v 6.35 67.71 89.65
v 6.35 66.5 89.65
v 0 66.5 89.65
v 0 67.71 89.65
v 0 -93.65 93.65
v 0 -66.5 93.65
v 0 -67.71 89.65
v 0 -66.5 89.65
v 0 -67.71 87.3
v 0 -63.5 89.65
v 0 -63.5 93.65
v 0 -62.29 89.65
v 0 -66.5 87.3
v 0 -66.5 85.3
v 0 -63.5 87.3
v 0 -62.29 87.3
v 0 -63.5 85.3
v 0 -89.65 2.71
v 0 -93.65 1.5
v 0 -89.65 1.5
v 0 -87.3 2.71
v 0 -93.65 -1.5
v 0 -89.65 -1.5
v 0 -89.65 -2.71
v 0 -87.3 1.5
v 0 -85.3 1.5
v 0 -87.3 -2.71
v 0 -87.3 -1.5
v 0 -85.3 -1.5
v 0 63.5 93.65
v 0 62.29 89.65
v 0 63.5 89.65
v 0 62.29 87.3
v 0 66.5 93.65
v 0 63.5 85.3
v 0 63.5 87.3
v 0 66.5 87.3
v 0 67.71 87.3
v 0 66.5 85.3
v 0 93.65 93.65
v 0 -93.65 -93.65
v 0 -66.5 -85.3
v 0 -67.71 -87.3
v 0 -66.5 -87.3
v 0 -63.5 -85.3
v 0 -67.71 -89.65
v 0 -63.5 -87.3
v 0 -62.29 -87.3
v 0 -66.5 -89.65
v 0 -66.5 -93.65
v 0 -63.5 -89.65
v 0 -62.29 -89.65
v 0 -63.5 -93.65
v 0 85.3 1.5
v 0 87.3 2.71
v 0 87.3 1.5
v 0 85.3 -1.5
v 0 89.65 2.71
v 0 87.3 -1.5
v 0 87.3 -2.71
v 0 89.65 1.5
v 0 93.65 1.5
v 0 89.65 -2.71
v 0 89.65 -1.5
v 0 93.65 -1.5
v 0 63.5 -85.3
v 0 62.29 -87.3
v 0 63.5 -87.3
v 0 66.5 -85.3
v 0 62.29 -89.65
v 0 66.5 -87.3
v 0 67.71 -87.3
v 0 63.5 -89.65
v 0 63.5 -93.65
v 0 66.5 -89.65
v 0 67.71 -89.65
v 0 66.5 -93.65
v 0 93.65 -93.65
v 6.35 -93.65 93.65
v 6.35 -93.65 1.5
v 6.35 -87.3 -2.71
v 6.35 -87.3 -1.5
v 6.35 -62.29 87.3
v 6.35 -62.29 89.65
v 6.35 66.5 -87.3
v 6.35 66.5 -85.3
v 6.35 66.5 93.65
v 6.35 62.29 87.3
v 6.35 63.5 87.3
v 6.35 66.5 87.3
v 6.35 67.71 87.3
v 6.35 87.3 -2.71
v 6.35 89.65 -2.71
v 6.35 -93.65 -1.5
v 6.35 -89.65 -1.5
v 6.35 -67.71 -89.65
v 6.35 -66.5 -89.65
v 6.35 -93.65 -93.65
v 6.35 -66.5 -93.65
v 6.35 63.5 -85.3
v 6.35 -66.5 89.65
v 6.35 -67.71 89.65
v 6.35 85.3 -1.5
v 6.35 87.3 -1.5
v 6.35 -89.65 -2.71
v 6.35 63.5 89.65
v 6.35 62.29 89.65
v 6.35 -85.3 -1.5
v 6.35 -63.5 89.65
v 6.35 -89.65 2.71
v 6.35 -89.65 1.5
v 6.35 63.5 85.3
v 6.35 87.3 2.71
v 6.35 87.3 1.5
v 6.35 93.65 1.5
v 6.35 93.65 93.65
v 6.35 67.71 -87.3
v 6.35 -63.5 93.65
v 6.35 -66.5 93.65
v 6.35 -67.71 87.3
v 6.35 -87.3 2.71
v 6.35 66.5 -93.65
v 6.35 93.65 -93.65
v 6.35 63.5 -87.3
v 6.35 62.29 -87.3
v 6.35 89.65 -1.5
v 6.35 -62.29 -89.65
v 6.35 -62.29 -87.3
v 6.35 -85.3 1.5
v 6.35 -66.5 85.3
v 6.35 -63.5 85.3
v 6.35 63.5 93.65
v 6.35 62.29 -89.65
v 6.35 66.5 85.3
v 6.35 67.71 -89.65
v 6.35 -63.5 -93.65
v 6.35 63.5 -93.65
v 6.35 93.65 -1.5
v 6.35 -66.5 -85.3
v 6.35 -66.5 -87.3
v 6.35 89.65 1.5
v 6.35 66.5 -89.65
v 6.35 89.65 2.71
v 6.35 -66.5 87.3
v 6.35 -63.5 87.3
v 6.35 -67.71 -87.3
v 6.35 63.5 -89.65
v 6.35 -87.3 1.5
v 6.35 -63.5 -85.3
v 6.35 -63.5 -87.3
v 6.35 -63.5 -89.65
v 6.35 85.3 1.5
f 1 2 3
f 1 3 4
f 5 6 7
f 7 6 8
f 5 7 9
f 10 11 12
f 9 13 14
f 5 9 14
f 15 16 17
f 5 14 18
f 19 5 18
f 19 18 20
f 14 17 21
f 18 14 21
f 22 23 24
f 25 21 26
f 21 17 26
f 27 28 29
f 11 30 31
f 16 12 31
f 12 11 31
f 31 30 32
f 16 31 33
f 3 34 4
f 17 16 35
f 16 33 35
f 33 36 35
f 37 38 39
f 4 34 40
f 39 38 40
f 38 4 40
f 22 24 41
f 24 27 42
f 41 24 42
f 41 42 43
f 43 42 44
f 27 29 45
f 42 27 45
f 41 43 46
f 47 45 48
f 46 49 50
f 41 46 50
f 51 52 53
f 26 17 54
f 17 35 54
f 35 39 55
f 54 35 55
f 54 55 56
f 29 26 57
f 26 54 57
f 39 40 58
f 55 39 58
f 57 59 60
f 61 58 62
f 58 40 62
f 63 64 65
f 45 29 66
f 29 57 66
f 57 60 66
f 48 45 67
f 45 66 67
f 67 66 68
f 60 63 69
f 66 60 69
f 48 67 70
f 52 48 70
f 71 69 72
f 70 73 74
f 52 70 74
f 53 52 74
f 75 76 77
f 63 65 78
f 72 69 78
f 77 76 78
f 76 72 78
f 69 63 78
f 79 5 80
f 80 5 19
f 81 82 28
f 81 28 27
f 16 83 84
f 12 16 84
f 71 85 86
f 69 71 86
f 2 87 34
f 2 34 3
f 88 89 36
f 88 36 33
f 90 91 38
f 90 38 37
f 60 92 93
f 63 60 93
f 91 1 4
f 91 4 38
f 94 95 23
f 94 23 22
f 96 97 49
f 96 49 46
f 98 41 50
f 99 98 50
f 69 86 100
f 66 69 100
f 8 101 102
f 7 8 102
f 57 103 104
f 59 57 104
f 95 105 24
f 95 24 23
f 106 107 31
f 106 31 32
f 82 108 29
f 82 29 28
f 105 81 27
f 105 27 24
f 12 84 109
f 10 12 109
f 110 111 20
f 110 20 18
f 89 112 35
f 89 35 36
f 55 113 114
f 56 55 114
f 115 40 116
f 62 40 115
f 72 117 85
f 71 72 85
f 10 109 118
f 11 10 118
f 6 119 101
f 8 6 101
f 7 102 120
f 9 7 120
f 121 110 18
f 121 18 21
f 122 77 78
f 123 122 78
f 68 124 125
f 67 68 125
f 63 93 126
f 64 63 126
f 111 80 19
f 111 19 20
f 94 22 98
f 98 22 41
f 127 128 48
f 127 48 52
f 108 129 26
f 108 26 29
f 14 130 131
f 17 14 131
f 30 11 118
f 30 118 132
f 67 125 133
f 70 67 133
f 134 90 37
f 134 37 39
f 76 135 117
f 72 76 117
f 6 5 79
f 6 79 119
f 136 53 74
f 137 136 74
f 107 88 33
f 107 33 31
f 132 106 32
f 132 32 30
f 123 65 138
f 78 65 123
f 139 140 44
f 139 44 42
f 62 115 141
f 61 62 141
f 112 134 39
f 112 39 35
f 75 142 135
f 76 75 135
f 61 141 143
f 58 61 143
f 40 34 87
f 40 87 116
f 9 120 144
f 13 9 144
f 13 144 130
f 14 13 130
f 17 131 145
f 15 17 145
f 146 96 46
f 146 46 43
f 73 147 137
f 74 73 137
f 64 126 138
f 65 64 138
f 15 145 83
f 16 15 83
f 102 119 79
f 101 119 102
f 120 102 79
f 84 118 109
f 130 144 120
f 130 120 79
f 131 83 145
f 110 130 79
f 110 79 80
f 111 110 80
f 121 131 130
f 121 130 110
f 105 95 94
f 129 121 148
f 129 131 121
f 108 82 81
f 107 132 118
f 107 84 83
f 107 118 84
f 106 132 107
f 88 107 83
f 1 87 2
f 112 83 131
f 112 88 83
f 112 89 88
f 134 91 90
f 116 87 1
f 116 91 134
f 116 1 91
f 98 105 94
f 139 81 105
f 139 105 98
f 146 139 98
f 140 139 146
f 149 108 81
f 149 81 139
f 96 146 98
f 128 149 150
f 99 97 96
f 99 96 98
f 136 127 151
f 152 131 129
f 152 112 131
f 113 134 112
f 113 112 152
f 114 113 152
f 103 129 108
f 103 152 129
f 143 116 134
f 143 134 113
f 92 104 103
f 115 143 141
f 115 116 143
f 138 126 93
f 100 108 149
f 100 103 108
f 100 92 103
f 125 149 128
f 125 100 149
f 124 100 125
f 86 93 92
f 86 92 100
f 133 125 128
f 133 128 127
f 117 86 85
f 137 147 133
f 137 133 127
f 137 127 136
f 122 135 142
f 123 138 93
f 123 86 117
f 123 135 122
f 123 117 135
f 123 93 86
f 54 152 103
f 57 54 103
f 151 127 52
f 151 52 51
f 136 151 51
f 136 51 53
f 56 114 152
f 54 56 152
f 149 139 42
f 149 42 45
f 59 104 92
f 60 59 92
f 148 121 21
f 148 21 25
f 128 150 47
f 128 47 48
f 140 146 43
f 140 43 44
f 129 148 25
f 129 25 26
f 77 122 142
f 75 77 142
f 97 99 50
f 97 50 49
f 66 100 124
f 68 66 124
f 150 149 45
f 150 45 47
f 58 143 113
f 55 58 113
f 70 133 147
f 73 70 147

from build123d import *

# Parameters (mm, degrees)
SKETCH1_W           = 187.3
SKETCH1_H           = 187.3
BOSS_EXTRUDE1_DEPTH = 6.35
CUT_EXTRUDE2_DEPTH  = 7.35


with BuildPart() as part:
    # Sketch1 → Boss-Extrude1 (new body)
    with BuildSketch(Plane(origin=(0, 0, 0), x_dir=(0, 0, -1), z_dir=(1, 0, 0))):
        Rectangle(SKETCH1_W, SKETCH1_H)
    extrude(amount=BOSS_EXTRUDE1_DEPTH)

    # Sketch3 → Cut-Extrude2 (cut, through all)
    with BuildSketch(Plane(origin=(6.35, 0, 0), x_dir=(0, 0, -1), z_dir=(1, 0, 0))):
        Polygon((-93.65, 66.5), (-89.65, 66.5), (-89.65, 67.71), (-87.3, 67.71), (-87.3, 66.5), (-85.3, 66.5), (-85.3, 63.5), (-87.3, 63.5), (-87.3, 62.29), (-89.65, 62.29), (-89.65, 63.5), (-93.65, 63.5), align=None)
        Polygon((-87.3, -63.5), (-87.3, -62.29), (-89.65, -62.29), (-89.65, -63.5), (-93.65, -63.5), (-93.65, -66.5), (-89.65, -66.5), (-89.65, -67.71), (-87.3, -67.71), (-87.3, -66.5), (-85.3, -66.5), (-85.3, -63.5), align=None)
        Polygon((93.65, -66.5), (89.65, -66.5), (89.65, -67.71), (87.3, -67.71), (87.3, -66.5), (85.3, -66.5), (85.3, -63.5), (87.3, -63.5), (87.3, -62.29), (89.65, -62.29), (89.65, -63.5), (93.65, -63.5), align=None)
        Polygon((87.3, 63.5), (87.3, 62.29), (89.65, 62.29), (89.65, 63.5), (93.65, 63.5), (93.65, 66.5), (89.65, 66.5), (89.65, 67.71), (87.3, 67.71), (87.3, 66.5), (85.3, 66.5), (85.3, 63.5), align=None)
        Polygon((-1.5, 93.65), (-1.5, 89.65), (-2.71, 89.65), (-2.71, 87.3), (-1.5, 87.3), (-1.5, 85.3), (1.5, 85.3), (1.5, 87.3), (2.71, 87.3), (2.71, 89.65), (1.5, 89.65), (1.5, 93.65), align=None)
        Polygon((-2.71, -87.3), (-1.5, -87.3), (-1.5, -85.3), (1.5, -85.3), (1.5, -87.3), (2.71, -87.3), (2.71, -89.65), (1.5, -89.65), (1.5, -93.65), (-1.5, -93.65), (-1.5, -89.65), (-2.71, -89.65), align=None)
    extrude(amount=-CUT_EXTRUDE2_DEPTH, mode=Mode.SUBTRACT)


solid = part.part
